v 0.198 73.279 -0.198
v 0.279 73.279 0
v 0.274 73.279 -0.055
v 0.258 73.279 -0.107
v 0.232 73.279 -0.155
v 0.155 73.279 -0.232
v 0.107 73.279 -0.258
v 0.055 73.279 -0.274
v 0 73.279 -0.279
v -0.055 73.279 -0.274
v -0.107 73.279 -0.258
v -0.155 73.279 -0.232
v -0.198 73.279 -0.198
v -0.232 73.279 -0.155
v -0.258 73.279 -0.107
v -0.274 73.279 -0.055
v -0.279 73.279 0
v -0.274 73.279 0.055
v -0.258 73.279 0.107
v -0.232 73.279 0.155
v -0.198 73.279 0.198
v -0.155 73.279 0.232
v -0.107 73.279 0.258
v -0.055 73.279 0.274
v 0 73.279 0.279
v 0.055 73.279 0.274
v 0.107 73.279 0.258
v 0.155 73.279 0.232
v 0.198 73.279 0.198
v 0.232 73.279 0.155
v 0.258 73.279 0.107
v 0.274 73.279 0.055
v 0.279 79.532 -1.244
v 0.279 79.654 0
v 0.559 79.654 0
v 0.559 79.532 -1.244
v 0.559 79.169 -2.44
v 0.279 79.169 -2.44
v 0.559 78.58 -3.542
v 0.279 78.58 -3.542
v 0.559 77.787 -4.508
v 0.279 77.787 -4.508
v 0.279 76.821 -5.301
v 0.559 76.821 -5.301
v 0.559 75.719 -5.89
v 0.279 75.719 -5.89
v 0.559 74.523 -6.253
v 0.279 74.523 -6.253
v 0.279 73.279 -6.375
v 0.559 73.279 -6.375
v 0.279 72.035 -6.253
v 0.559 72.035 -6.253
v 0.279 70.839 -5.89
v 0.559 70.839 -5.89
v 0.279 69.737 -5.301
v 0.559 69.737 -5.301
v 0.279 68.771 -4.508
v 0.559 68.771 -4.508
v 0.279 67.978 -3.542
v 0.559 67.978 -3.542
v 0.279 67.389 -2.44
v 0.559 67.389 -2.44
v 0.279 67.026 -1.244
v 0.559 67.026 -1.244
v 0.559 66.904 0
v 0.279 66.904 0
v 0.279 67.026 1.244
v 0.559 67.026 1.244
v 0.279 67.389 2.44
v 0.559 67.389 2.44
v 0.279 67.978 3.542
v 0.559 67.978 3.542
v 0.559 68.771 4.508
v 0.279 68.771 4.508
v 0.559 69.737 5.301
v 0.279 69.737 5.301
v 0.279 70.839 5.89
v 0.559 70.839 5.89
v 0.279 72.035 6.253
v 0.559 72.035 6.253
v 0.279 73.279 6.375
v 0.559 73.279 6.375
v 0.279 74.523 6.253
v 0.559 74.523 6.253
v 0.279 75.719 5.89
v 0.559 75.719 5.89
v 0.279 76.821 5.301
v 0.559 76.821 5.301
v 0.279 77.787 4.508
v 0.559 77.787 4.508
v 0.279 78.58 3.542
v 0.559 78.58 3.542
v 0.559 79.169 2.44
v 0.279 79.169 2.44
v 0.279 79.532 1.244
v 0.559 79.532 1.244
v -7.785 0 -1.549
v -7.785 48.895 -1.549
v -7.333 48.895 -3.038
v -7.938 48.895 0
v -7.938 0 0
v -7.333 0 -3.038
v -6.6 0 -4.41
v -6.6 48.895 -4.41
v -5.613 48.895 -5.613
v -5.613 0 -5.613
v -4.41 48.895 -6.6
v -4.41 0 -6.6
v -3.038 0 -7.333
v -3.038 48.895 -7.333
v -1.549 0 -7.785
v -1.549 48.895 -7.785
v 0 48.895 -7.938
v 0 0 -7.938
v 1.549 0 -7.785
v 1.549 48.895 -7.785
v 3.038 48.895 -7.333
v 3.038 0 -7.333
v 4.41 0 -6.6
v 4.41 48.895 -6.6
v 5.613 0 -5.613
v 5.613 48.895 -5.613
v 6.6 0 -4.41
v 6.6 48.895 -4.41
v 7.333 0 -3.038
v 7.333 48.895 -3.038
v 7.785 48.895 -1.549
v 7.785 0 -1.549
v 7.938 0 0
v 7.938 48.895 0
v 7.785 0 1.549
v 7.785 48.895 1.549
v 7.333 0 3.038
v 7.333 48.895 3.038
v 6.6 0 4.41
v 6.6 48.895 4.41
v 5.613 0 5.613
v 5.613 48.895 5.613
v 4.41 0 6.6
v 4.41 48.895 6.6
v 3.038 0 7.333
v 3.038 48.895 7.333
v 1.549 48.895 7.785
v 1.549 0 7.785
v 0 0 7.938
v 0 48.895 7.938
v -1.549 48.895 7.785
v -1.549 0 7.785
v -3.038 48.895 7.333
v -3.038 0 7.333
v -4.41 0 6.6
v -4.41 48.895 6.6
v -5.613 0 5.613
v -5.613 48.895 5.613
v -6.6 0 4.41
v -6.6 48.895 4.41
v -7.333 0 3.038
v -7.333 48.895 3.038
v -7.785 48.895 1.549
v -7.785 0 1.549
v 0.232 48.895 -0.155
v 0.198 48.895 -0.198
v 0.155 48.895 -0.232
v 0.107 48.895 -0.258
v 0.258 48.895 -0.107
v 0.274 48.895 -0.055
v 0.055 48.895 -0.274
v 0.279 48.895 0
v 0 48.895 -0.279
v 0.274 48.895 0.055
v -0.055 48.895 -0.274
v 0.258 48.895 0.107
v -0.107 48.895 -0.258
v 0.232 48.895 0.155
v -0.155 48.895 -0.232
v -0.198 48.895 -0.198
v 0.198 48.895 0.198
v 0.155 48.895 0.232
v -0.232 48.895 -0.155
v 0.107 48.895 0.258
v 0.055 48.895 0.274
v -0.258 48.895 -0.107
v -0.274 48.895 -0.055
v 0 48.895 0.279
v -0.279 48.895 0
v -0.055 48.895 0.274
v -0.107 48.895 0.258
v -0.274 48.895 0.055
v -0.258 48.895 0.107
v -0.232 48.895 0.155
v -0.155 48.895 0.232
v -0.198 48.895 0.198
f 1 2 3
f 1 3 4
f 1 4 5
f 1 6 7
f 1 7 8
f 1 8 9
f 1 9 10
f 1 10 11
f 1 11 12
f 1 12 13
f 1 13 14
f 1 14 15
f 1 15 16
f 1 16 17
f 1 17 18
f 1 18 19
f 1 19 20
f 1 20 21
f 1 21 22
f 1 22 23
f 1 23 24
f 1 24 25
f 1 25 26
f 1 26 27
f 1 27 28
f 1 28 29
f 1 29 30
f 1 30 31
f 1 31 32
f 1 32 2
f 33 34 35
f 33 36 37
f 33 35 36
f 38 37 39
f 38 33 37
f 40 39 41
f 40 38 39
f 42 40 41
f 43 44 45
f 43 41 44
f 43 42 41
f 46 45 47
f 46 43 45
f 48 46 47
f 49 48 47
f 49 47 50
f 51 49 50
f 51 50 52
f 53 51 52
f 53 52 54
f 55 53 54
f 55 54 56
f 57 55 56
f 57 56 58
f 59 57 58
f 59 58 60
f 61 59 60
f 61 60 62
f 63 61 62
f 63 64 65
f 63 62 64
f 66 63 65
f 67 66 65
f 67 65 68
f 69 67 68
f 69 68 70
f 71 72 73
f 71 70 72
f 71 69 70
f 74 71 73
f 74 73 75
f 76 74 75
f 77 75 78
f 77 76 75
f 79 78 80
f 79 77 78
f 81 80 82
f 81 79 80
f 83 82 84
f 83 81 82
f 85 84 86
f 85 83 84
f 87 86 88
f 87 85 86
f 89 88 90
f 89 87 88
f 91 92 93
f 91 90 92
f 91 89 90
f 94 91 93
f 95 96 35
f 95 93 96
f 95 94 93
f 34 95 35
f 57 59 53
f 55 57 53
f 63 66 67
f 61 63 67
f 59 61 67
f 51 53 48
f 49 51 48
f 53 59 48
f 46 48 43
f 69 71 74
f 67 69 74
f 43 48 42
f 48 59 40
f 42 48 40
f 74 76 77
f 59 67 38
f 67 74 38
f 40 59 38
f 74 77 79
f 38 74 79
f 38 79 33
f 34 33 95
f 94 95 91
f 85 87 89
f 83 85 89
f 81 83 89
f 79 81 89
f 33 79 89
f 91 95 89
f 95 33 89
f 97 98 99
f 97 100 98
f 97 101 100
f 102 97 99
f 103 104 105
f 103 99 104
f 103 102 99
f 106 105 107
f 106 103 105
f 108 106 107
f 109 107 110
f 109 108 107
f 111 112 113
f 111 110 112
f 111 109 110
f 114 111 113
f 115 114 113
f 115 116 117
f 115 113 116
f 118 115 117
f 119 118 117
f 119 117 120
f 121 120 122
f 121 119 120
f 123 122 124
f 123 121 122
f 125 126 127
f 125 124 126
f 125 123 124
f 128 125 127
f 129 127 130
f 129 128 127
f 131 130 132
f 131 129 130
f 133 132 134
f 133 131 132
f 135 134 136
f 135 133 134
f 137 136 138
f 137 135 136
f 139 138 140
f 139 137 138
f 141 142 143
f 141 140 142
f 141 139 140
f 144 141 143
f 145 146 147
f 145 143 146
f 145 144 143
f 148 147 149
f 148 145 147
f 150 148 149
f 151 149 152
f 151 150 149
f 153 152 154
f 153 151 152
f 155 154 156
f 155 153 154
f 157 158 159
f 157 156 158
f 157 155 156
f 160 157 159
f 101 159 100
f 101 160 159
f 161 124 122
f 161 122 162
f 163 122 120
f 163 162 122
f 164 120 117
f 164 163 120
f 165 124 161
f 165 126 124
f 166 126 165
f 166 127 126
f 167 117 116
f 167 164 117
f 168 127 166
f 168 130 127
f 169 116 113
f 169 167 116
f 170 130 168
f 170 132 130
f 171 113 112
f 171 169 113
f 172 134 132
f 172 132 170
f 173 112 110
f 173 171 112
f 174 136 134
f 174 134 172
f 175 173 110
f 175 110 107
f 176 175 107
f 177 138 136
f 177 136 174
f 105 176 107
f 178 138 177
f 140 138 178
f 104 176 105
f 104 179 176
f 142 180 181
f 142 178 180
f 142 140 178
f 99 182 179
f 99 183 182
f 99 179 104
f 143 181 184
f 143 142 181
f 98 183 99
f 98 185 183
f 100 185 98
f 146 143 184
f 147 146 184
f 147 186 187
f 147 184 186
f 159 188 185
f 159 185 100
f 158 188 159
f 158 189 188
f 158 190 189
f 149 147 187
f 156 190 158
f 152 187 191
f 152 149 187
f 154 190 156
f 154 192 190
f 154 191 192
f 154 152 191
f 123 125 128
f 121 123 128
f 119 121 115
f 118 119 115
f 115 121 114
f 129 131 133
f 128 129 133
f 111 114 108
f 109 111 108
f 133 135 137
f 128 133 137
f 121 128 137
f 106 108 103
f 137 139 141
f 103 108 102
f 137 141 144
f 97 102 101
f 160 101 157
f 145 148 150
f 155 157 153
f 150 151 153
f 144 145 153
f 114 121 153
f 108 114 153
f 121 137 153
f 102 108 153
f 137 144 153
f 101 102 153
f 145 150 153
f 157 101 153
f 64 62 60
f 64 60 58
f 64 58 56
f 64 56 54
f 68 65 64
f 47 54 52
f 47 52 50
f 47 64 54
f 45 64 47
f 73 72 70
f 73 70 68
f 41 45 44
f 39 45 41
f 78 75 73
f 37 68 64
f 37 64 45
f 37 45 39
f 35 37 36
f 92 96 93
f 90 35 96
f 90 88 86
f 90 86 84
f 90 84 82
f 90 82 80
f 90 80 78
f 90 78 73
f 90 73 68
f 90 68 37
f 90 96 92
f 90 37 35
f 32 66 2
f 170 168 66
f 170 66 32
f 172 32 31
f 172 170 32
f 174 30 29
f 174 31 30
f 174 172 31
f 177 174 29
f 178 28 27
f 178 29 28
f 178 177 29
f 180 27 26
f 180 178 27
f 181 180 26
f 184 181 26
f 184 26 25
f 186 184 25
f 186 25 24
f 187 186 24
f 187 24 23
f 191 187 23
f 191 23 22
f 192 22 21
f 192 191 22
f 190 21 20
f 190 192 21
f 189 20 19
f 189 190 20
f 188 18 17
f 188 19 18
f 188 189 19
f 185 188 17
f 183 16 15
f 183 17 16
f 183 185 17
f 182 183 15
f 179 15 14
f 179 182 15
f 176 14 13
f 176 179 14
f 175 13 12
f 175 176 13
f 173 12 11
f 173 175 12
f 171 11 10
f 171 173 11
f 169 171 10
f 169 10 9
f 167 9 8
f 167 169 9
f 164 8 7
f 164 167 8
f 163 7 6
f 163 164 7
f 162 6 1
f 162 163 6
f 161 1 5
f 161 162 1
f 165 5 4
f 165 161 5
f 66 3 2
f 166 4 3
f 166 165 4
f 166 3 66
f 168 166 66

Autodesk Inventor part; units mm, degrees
ref_plane "YZ Plane" through (0, 0, 0) normal (1, 0, 0) x (0, 1, 0)
ref_plane "XZ Plane" through (0, 0, 0) normal (0, 1, 0) x (-1, 0, 0)
sketch "Sketch1" plane through (0, 0, 0) normal (0, 1, 0) x (-1, 0, 0)
  circle A0 centre (0, 0) radius 7.9375
  dimension "d0" = 15.875
extrude "Extrusion1" add sketch "Sketch1" along normal blind 48.895
sketch "Sketch2" plane through (0, 48.895, 0) normal (0, 1, 0) x (1, 0, 0)
  circle A0 centre (0, 0) radius 0.2794
  dimension "d3" = 0.5588
extrude "Extrusion2" add sketch "Sketch2" along normal blind 24.384
sketch "Sketch3" plane through (0, 73.279, 0) normal (0, 1, 0) x (1, 0, 0)
  circle A0 centre (0, 0) radius 0.2794 projected
  point P0 (0.2794, 0)
ref_plane "Work Plane1" through (0.2794, 73.279, 0) normal (1, 0, 0) x (0, 1, 0)
sketch "Sketch4" plane through (0.2794, 73.279, 0) normal (1, 0, 0) x (0, 1, 0)
  line L0 (0, -0.2794) -> (0, 0.2794) projected
  circle A0 centre (0, 0) radius 6.3754
  point P0 (-73.279, 0)
  dimension "d6" = 12.7508
extrude "Extrusion3" add sketch "Sketch4" along normal blind 0.2794
ref_plane "Work Plane4" through (0, 73.279, 0) normal (0.7071, 0, 0.7071) x (0, -1, 0)
ref_plane "Work Plane3" through (0.5588, 73.279, 0) normal (0.7071, 0, 0.7071) x (0, -1, 0)
properties part number "CRS4kHz"
